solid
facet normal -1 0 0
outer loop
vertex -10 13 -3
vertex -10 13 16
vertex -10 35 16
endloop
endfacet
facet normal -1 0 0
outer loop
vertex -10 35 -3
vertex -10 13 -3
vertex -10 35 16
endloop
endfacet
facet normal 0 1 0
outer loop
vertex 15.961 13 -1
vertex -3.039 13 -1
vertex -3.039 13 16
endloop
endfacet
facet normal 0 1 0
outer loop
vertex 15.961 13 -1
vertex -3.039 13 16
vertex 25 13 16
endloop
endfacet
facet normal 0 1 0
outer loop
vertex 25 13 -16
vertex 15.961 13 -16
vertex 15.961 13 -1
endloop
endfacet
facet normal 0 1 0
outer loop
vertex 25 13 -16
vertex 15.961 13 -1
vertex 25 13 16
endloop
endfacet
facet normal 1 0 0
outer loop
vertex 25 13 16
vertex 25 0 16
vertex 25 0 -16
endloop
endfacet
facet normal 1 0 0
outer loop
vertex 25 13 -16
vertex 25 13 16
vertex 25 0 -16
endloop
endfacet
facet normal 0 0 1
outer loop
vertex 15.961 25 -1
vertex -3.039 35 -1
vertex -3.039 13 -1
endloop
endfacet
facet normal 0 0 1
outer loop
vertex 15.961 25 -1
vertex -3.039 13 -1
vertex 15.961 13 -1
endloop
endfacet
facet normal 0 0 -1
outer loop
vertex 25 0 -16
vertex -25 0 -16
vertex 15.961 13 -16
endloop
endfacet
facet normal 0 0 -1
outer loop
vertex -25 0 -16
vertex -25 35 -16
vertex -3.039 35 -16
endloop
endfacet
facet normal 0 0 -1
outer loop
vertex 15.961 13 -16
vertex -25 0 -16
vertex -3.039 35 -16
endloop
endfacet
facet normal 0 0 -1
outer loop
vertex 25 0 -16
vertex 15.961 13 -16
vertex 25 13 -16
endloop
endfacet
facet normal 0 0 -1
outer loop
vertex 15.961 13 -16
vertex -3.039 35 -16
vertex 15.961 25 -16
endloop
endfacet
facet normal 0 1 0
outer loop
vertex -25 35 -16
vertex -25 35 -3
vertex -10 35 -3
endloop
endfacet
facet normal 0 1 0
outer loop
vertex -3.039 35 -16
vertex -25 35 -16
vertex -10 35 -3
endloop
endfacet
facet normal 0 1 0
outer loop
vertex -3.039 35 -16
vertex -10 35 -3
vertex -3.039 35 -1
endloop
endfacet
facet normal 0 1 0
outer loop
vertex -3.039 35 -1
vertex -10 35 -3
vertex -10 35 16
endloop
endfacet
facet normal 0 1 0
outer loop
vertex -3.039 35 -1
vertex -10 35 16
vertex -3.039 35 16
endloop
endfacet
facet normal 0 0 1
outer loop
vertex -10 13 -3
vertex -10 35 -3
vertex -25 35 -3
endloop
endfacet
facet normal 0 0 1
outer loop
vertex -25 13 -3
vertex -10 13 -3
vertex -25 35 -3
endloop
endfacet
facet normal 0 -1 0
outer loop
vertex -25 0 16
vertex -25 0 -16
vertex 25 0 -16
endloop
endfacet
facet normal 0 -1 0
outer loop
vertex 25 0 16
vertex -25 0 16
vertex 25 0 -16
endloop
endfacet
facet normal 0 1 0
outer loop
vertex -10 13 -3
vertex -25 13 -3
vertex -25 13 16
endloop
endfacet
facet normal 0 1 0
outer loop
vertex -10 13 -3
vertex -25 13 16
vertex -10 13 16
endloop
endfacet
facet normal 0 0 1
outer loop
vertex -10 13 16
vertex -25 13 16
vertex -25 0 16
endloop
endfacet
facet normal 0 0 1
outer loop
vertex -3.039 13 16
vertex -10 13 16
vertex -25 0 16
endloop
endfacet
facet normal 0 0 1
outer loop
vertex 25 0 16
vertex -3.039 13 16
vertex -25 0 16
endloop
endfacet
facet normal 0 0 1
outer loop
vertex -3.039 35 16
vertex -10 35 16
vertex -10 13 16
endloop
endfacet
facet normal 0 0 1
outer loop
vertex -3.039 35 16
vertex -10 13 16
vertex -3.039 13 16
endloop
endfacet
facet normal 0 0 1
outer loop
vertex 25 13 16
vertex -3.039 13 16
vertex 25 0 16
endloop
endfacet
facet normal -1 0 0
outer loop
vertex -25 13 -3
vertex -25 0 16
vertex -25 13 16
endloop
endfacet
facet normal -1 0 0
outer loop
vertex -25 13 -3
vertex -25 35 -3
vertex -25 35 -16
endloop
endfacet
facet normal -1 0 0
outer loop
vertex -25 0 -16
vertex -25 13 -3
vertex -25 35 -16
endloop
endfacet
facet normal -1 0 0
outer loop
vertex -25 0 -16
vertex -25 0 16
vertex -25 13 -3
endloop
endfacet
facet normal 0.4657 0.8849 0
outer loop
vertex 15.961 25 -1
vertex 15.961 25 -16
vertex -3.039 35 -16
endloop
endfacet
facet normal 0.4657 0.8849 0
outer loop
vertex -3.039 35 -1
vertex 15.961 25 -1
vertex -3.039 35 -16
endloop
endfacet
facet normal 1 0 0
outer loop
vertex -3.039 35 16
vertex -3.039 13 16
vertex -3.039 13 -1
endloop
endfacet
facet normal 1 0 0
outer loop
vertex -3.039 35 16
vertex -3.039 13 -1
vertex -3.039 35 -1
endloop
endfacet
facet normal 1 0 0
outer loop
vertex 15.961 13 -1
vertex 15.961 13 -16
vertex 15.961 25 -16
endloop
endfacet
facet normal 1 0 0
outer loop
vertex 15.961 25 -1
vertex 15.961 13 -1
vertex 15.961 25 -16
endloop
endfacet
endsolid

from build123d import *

# Parameters (mm, degrees)
SKETCH1_W           = 50
SKETCH1_H           = 32
BOSS_EXTRUDE1_DEPTH = 13
SKETCH2_W           = 15
SKETCH2_H           = 22
BOSS_EXTRUDE2_DEPTH = 13
SKETCH3_W           = 6.961388266
SKETCH3_H           = 22
BOSS_EXTRUDE3_DEPTH = 32
SKETCH4_W           = 19
SKETCH4_H           = 12
BOSS_EXTRUDE4_DEPTH = 15
BOSS_EXTRUDE5_DEPTH = 15


with BuildPart() as part:
    # Sketch1 → Boss-Extrude1 (new body)
    with BuildSketch(Plane(origin=(0, 0, 0), x_dir=(1, 0, 0), z_dir=(0, 1, 0))):
        Rectangle(SKETCH1_W, SKETCH1_H)
    extrude(amount=BOSS_EXTRUDE1_DEPTH)

    # Sketch2 → Boss-Extrude2 (add)
    with BuildSketch(Plane(origin=(0, 0, -16), x_dir=(-1, 0, 0), z_dir=(0, 0, -1))):
        with Locations((17.5, 24)):
            Rectangle(SKETCH2_W, SKETCH2_H)
    extrude(amount=-BOSS_EXTRUDE2_DEPTH)

    # Sketch3 → Boss-Extrude3 (add)
    with BuildSketch(Plane.XY.offset(16)):
        with Locations((-6.519305867, 24)):
            Rectangle(SKETCH3_W, SKETCH3_H)
    extrude(amount=-BOSS_EXTRUDE3_DEPTH)

    # Sketch4 → Boss-Extrude4 (add)
    with BuildSketch(Plane(origin=(0, 0, -16), x_dir=(-1, 0, 0), z_dir=(0, 0, -1))):
        with Locations((-6.461388266, 19)):
            Rectangle(SKETCH4_W, SKETCH4_H)
    extrude(amount=-BOSS_EXTRUDE4_DEPTH)

    # Sketch5 → Boss-Extrude5 (add)
    with BuildSketch(Plane(origin=(0, 0, -16), x_dir=(-1, 0, 0), z_dir=(0, 0, -1))):
        Polygon((-15.961388266, 25), (3.038611734, 35), (3.038611734, 25), align=None)
    extrude(amount=-BOSS_EXTRUDE5_DEPTH)


solid = part.part
